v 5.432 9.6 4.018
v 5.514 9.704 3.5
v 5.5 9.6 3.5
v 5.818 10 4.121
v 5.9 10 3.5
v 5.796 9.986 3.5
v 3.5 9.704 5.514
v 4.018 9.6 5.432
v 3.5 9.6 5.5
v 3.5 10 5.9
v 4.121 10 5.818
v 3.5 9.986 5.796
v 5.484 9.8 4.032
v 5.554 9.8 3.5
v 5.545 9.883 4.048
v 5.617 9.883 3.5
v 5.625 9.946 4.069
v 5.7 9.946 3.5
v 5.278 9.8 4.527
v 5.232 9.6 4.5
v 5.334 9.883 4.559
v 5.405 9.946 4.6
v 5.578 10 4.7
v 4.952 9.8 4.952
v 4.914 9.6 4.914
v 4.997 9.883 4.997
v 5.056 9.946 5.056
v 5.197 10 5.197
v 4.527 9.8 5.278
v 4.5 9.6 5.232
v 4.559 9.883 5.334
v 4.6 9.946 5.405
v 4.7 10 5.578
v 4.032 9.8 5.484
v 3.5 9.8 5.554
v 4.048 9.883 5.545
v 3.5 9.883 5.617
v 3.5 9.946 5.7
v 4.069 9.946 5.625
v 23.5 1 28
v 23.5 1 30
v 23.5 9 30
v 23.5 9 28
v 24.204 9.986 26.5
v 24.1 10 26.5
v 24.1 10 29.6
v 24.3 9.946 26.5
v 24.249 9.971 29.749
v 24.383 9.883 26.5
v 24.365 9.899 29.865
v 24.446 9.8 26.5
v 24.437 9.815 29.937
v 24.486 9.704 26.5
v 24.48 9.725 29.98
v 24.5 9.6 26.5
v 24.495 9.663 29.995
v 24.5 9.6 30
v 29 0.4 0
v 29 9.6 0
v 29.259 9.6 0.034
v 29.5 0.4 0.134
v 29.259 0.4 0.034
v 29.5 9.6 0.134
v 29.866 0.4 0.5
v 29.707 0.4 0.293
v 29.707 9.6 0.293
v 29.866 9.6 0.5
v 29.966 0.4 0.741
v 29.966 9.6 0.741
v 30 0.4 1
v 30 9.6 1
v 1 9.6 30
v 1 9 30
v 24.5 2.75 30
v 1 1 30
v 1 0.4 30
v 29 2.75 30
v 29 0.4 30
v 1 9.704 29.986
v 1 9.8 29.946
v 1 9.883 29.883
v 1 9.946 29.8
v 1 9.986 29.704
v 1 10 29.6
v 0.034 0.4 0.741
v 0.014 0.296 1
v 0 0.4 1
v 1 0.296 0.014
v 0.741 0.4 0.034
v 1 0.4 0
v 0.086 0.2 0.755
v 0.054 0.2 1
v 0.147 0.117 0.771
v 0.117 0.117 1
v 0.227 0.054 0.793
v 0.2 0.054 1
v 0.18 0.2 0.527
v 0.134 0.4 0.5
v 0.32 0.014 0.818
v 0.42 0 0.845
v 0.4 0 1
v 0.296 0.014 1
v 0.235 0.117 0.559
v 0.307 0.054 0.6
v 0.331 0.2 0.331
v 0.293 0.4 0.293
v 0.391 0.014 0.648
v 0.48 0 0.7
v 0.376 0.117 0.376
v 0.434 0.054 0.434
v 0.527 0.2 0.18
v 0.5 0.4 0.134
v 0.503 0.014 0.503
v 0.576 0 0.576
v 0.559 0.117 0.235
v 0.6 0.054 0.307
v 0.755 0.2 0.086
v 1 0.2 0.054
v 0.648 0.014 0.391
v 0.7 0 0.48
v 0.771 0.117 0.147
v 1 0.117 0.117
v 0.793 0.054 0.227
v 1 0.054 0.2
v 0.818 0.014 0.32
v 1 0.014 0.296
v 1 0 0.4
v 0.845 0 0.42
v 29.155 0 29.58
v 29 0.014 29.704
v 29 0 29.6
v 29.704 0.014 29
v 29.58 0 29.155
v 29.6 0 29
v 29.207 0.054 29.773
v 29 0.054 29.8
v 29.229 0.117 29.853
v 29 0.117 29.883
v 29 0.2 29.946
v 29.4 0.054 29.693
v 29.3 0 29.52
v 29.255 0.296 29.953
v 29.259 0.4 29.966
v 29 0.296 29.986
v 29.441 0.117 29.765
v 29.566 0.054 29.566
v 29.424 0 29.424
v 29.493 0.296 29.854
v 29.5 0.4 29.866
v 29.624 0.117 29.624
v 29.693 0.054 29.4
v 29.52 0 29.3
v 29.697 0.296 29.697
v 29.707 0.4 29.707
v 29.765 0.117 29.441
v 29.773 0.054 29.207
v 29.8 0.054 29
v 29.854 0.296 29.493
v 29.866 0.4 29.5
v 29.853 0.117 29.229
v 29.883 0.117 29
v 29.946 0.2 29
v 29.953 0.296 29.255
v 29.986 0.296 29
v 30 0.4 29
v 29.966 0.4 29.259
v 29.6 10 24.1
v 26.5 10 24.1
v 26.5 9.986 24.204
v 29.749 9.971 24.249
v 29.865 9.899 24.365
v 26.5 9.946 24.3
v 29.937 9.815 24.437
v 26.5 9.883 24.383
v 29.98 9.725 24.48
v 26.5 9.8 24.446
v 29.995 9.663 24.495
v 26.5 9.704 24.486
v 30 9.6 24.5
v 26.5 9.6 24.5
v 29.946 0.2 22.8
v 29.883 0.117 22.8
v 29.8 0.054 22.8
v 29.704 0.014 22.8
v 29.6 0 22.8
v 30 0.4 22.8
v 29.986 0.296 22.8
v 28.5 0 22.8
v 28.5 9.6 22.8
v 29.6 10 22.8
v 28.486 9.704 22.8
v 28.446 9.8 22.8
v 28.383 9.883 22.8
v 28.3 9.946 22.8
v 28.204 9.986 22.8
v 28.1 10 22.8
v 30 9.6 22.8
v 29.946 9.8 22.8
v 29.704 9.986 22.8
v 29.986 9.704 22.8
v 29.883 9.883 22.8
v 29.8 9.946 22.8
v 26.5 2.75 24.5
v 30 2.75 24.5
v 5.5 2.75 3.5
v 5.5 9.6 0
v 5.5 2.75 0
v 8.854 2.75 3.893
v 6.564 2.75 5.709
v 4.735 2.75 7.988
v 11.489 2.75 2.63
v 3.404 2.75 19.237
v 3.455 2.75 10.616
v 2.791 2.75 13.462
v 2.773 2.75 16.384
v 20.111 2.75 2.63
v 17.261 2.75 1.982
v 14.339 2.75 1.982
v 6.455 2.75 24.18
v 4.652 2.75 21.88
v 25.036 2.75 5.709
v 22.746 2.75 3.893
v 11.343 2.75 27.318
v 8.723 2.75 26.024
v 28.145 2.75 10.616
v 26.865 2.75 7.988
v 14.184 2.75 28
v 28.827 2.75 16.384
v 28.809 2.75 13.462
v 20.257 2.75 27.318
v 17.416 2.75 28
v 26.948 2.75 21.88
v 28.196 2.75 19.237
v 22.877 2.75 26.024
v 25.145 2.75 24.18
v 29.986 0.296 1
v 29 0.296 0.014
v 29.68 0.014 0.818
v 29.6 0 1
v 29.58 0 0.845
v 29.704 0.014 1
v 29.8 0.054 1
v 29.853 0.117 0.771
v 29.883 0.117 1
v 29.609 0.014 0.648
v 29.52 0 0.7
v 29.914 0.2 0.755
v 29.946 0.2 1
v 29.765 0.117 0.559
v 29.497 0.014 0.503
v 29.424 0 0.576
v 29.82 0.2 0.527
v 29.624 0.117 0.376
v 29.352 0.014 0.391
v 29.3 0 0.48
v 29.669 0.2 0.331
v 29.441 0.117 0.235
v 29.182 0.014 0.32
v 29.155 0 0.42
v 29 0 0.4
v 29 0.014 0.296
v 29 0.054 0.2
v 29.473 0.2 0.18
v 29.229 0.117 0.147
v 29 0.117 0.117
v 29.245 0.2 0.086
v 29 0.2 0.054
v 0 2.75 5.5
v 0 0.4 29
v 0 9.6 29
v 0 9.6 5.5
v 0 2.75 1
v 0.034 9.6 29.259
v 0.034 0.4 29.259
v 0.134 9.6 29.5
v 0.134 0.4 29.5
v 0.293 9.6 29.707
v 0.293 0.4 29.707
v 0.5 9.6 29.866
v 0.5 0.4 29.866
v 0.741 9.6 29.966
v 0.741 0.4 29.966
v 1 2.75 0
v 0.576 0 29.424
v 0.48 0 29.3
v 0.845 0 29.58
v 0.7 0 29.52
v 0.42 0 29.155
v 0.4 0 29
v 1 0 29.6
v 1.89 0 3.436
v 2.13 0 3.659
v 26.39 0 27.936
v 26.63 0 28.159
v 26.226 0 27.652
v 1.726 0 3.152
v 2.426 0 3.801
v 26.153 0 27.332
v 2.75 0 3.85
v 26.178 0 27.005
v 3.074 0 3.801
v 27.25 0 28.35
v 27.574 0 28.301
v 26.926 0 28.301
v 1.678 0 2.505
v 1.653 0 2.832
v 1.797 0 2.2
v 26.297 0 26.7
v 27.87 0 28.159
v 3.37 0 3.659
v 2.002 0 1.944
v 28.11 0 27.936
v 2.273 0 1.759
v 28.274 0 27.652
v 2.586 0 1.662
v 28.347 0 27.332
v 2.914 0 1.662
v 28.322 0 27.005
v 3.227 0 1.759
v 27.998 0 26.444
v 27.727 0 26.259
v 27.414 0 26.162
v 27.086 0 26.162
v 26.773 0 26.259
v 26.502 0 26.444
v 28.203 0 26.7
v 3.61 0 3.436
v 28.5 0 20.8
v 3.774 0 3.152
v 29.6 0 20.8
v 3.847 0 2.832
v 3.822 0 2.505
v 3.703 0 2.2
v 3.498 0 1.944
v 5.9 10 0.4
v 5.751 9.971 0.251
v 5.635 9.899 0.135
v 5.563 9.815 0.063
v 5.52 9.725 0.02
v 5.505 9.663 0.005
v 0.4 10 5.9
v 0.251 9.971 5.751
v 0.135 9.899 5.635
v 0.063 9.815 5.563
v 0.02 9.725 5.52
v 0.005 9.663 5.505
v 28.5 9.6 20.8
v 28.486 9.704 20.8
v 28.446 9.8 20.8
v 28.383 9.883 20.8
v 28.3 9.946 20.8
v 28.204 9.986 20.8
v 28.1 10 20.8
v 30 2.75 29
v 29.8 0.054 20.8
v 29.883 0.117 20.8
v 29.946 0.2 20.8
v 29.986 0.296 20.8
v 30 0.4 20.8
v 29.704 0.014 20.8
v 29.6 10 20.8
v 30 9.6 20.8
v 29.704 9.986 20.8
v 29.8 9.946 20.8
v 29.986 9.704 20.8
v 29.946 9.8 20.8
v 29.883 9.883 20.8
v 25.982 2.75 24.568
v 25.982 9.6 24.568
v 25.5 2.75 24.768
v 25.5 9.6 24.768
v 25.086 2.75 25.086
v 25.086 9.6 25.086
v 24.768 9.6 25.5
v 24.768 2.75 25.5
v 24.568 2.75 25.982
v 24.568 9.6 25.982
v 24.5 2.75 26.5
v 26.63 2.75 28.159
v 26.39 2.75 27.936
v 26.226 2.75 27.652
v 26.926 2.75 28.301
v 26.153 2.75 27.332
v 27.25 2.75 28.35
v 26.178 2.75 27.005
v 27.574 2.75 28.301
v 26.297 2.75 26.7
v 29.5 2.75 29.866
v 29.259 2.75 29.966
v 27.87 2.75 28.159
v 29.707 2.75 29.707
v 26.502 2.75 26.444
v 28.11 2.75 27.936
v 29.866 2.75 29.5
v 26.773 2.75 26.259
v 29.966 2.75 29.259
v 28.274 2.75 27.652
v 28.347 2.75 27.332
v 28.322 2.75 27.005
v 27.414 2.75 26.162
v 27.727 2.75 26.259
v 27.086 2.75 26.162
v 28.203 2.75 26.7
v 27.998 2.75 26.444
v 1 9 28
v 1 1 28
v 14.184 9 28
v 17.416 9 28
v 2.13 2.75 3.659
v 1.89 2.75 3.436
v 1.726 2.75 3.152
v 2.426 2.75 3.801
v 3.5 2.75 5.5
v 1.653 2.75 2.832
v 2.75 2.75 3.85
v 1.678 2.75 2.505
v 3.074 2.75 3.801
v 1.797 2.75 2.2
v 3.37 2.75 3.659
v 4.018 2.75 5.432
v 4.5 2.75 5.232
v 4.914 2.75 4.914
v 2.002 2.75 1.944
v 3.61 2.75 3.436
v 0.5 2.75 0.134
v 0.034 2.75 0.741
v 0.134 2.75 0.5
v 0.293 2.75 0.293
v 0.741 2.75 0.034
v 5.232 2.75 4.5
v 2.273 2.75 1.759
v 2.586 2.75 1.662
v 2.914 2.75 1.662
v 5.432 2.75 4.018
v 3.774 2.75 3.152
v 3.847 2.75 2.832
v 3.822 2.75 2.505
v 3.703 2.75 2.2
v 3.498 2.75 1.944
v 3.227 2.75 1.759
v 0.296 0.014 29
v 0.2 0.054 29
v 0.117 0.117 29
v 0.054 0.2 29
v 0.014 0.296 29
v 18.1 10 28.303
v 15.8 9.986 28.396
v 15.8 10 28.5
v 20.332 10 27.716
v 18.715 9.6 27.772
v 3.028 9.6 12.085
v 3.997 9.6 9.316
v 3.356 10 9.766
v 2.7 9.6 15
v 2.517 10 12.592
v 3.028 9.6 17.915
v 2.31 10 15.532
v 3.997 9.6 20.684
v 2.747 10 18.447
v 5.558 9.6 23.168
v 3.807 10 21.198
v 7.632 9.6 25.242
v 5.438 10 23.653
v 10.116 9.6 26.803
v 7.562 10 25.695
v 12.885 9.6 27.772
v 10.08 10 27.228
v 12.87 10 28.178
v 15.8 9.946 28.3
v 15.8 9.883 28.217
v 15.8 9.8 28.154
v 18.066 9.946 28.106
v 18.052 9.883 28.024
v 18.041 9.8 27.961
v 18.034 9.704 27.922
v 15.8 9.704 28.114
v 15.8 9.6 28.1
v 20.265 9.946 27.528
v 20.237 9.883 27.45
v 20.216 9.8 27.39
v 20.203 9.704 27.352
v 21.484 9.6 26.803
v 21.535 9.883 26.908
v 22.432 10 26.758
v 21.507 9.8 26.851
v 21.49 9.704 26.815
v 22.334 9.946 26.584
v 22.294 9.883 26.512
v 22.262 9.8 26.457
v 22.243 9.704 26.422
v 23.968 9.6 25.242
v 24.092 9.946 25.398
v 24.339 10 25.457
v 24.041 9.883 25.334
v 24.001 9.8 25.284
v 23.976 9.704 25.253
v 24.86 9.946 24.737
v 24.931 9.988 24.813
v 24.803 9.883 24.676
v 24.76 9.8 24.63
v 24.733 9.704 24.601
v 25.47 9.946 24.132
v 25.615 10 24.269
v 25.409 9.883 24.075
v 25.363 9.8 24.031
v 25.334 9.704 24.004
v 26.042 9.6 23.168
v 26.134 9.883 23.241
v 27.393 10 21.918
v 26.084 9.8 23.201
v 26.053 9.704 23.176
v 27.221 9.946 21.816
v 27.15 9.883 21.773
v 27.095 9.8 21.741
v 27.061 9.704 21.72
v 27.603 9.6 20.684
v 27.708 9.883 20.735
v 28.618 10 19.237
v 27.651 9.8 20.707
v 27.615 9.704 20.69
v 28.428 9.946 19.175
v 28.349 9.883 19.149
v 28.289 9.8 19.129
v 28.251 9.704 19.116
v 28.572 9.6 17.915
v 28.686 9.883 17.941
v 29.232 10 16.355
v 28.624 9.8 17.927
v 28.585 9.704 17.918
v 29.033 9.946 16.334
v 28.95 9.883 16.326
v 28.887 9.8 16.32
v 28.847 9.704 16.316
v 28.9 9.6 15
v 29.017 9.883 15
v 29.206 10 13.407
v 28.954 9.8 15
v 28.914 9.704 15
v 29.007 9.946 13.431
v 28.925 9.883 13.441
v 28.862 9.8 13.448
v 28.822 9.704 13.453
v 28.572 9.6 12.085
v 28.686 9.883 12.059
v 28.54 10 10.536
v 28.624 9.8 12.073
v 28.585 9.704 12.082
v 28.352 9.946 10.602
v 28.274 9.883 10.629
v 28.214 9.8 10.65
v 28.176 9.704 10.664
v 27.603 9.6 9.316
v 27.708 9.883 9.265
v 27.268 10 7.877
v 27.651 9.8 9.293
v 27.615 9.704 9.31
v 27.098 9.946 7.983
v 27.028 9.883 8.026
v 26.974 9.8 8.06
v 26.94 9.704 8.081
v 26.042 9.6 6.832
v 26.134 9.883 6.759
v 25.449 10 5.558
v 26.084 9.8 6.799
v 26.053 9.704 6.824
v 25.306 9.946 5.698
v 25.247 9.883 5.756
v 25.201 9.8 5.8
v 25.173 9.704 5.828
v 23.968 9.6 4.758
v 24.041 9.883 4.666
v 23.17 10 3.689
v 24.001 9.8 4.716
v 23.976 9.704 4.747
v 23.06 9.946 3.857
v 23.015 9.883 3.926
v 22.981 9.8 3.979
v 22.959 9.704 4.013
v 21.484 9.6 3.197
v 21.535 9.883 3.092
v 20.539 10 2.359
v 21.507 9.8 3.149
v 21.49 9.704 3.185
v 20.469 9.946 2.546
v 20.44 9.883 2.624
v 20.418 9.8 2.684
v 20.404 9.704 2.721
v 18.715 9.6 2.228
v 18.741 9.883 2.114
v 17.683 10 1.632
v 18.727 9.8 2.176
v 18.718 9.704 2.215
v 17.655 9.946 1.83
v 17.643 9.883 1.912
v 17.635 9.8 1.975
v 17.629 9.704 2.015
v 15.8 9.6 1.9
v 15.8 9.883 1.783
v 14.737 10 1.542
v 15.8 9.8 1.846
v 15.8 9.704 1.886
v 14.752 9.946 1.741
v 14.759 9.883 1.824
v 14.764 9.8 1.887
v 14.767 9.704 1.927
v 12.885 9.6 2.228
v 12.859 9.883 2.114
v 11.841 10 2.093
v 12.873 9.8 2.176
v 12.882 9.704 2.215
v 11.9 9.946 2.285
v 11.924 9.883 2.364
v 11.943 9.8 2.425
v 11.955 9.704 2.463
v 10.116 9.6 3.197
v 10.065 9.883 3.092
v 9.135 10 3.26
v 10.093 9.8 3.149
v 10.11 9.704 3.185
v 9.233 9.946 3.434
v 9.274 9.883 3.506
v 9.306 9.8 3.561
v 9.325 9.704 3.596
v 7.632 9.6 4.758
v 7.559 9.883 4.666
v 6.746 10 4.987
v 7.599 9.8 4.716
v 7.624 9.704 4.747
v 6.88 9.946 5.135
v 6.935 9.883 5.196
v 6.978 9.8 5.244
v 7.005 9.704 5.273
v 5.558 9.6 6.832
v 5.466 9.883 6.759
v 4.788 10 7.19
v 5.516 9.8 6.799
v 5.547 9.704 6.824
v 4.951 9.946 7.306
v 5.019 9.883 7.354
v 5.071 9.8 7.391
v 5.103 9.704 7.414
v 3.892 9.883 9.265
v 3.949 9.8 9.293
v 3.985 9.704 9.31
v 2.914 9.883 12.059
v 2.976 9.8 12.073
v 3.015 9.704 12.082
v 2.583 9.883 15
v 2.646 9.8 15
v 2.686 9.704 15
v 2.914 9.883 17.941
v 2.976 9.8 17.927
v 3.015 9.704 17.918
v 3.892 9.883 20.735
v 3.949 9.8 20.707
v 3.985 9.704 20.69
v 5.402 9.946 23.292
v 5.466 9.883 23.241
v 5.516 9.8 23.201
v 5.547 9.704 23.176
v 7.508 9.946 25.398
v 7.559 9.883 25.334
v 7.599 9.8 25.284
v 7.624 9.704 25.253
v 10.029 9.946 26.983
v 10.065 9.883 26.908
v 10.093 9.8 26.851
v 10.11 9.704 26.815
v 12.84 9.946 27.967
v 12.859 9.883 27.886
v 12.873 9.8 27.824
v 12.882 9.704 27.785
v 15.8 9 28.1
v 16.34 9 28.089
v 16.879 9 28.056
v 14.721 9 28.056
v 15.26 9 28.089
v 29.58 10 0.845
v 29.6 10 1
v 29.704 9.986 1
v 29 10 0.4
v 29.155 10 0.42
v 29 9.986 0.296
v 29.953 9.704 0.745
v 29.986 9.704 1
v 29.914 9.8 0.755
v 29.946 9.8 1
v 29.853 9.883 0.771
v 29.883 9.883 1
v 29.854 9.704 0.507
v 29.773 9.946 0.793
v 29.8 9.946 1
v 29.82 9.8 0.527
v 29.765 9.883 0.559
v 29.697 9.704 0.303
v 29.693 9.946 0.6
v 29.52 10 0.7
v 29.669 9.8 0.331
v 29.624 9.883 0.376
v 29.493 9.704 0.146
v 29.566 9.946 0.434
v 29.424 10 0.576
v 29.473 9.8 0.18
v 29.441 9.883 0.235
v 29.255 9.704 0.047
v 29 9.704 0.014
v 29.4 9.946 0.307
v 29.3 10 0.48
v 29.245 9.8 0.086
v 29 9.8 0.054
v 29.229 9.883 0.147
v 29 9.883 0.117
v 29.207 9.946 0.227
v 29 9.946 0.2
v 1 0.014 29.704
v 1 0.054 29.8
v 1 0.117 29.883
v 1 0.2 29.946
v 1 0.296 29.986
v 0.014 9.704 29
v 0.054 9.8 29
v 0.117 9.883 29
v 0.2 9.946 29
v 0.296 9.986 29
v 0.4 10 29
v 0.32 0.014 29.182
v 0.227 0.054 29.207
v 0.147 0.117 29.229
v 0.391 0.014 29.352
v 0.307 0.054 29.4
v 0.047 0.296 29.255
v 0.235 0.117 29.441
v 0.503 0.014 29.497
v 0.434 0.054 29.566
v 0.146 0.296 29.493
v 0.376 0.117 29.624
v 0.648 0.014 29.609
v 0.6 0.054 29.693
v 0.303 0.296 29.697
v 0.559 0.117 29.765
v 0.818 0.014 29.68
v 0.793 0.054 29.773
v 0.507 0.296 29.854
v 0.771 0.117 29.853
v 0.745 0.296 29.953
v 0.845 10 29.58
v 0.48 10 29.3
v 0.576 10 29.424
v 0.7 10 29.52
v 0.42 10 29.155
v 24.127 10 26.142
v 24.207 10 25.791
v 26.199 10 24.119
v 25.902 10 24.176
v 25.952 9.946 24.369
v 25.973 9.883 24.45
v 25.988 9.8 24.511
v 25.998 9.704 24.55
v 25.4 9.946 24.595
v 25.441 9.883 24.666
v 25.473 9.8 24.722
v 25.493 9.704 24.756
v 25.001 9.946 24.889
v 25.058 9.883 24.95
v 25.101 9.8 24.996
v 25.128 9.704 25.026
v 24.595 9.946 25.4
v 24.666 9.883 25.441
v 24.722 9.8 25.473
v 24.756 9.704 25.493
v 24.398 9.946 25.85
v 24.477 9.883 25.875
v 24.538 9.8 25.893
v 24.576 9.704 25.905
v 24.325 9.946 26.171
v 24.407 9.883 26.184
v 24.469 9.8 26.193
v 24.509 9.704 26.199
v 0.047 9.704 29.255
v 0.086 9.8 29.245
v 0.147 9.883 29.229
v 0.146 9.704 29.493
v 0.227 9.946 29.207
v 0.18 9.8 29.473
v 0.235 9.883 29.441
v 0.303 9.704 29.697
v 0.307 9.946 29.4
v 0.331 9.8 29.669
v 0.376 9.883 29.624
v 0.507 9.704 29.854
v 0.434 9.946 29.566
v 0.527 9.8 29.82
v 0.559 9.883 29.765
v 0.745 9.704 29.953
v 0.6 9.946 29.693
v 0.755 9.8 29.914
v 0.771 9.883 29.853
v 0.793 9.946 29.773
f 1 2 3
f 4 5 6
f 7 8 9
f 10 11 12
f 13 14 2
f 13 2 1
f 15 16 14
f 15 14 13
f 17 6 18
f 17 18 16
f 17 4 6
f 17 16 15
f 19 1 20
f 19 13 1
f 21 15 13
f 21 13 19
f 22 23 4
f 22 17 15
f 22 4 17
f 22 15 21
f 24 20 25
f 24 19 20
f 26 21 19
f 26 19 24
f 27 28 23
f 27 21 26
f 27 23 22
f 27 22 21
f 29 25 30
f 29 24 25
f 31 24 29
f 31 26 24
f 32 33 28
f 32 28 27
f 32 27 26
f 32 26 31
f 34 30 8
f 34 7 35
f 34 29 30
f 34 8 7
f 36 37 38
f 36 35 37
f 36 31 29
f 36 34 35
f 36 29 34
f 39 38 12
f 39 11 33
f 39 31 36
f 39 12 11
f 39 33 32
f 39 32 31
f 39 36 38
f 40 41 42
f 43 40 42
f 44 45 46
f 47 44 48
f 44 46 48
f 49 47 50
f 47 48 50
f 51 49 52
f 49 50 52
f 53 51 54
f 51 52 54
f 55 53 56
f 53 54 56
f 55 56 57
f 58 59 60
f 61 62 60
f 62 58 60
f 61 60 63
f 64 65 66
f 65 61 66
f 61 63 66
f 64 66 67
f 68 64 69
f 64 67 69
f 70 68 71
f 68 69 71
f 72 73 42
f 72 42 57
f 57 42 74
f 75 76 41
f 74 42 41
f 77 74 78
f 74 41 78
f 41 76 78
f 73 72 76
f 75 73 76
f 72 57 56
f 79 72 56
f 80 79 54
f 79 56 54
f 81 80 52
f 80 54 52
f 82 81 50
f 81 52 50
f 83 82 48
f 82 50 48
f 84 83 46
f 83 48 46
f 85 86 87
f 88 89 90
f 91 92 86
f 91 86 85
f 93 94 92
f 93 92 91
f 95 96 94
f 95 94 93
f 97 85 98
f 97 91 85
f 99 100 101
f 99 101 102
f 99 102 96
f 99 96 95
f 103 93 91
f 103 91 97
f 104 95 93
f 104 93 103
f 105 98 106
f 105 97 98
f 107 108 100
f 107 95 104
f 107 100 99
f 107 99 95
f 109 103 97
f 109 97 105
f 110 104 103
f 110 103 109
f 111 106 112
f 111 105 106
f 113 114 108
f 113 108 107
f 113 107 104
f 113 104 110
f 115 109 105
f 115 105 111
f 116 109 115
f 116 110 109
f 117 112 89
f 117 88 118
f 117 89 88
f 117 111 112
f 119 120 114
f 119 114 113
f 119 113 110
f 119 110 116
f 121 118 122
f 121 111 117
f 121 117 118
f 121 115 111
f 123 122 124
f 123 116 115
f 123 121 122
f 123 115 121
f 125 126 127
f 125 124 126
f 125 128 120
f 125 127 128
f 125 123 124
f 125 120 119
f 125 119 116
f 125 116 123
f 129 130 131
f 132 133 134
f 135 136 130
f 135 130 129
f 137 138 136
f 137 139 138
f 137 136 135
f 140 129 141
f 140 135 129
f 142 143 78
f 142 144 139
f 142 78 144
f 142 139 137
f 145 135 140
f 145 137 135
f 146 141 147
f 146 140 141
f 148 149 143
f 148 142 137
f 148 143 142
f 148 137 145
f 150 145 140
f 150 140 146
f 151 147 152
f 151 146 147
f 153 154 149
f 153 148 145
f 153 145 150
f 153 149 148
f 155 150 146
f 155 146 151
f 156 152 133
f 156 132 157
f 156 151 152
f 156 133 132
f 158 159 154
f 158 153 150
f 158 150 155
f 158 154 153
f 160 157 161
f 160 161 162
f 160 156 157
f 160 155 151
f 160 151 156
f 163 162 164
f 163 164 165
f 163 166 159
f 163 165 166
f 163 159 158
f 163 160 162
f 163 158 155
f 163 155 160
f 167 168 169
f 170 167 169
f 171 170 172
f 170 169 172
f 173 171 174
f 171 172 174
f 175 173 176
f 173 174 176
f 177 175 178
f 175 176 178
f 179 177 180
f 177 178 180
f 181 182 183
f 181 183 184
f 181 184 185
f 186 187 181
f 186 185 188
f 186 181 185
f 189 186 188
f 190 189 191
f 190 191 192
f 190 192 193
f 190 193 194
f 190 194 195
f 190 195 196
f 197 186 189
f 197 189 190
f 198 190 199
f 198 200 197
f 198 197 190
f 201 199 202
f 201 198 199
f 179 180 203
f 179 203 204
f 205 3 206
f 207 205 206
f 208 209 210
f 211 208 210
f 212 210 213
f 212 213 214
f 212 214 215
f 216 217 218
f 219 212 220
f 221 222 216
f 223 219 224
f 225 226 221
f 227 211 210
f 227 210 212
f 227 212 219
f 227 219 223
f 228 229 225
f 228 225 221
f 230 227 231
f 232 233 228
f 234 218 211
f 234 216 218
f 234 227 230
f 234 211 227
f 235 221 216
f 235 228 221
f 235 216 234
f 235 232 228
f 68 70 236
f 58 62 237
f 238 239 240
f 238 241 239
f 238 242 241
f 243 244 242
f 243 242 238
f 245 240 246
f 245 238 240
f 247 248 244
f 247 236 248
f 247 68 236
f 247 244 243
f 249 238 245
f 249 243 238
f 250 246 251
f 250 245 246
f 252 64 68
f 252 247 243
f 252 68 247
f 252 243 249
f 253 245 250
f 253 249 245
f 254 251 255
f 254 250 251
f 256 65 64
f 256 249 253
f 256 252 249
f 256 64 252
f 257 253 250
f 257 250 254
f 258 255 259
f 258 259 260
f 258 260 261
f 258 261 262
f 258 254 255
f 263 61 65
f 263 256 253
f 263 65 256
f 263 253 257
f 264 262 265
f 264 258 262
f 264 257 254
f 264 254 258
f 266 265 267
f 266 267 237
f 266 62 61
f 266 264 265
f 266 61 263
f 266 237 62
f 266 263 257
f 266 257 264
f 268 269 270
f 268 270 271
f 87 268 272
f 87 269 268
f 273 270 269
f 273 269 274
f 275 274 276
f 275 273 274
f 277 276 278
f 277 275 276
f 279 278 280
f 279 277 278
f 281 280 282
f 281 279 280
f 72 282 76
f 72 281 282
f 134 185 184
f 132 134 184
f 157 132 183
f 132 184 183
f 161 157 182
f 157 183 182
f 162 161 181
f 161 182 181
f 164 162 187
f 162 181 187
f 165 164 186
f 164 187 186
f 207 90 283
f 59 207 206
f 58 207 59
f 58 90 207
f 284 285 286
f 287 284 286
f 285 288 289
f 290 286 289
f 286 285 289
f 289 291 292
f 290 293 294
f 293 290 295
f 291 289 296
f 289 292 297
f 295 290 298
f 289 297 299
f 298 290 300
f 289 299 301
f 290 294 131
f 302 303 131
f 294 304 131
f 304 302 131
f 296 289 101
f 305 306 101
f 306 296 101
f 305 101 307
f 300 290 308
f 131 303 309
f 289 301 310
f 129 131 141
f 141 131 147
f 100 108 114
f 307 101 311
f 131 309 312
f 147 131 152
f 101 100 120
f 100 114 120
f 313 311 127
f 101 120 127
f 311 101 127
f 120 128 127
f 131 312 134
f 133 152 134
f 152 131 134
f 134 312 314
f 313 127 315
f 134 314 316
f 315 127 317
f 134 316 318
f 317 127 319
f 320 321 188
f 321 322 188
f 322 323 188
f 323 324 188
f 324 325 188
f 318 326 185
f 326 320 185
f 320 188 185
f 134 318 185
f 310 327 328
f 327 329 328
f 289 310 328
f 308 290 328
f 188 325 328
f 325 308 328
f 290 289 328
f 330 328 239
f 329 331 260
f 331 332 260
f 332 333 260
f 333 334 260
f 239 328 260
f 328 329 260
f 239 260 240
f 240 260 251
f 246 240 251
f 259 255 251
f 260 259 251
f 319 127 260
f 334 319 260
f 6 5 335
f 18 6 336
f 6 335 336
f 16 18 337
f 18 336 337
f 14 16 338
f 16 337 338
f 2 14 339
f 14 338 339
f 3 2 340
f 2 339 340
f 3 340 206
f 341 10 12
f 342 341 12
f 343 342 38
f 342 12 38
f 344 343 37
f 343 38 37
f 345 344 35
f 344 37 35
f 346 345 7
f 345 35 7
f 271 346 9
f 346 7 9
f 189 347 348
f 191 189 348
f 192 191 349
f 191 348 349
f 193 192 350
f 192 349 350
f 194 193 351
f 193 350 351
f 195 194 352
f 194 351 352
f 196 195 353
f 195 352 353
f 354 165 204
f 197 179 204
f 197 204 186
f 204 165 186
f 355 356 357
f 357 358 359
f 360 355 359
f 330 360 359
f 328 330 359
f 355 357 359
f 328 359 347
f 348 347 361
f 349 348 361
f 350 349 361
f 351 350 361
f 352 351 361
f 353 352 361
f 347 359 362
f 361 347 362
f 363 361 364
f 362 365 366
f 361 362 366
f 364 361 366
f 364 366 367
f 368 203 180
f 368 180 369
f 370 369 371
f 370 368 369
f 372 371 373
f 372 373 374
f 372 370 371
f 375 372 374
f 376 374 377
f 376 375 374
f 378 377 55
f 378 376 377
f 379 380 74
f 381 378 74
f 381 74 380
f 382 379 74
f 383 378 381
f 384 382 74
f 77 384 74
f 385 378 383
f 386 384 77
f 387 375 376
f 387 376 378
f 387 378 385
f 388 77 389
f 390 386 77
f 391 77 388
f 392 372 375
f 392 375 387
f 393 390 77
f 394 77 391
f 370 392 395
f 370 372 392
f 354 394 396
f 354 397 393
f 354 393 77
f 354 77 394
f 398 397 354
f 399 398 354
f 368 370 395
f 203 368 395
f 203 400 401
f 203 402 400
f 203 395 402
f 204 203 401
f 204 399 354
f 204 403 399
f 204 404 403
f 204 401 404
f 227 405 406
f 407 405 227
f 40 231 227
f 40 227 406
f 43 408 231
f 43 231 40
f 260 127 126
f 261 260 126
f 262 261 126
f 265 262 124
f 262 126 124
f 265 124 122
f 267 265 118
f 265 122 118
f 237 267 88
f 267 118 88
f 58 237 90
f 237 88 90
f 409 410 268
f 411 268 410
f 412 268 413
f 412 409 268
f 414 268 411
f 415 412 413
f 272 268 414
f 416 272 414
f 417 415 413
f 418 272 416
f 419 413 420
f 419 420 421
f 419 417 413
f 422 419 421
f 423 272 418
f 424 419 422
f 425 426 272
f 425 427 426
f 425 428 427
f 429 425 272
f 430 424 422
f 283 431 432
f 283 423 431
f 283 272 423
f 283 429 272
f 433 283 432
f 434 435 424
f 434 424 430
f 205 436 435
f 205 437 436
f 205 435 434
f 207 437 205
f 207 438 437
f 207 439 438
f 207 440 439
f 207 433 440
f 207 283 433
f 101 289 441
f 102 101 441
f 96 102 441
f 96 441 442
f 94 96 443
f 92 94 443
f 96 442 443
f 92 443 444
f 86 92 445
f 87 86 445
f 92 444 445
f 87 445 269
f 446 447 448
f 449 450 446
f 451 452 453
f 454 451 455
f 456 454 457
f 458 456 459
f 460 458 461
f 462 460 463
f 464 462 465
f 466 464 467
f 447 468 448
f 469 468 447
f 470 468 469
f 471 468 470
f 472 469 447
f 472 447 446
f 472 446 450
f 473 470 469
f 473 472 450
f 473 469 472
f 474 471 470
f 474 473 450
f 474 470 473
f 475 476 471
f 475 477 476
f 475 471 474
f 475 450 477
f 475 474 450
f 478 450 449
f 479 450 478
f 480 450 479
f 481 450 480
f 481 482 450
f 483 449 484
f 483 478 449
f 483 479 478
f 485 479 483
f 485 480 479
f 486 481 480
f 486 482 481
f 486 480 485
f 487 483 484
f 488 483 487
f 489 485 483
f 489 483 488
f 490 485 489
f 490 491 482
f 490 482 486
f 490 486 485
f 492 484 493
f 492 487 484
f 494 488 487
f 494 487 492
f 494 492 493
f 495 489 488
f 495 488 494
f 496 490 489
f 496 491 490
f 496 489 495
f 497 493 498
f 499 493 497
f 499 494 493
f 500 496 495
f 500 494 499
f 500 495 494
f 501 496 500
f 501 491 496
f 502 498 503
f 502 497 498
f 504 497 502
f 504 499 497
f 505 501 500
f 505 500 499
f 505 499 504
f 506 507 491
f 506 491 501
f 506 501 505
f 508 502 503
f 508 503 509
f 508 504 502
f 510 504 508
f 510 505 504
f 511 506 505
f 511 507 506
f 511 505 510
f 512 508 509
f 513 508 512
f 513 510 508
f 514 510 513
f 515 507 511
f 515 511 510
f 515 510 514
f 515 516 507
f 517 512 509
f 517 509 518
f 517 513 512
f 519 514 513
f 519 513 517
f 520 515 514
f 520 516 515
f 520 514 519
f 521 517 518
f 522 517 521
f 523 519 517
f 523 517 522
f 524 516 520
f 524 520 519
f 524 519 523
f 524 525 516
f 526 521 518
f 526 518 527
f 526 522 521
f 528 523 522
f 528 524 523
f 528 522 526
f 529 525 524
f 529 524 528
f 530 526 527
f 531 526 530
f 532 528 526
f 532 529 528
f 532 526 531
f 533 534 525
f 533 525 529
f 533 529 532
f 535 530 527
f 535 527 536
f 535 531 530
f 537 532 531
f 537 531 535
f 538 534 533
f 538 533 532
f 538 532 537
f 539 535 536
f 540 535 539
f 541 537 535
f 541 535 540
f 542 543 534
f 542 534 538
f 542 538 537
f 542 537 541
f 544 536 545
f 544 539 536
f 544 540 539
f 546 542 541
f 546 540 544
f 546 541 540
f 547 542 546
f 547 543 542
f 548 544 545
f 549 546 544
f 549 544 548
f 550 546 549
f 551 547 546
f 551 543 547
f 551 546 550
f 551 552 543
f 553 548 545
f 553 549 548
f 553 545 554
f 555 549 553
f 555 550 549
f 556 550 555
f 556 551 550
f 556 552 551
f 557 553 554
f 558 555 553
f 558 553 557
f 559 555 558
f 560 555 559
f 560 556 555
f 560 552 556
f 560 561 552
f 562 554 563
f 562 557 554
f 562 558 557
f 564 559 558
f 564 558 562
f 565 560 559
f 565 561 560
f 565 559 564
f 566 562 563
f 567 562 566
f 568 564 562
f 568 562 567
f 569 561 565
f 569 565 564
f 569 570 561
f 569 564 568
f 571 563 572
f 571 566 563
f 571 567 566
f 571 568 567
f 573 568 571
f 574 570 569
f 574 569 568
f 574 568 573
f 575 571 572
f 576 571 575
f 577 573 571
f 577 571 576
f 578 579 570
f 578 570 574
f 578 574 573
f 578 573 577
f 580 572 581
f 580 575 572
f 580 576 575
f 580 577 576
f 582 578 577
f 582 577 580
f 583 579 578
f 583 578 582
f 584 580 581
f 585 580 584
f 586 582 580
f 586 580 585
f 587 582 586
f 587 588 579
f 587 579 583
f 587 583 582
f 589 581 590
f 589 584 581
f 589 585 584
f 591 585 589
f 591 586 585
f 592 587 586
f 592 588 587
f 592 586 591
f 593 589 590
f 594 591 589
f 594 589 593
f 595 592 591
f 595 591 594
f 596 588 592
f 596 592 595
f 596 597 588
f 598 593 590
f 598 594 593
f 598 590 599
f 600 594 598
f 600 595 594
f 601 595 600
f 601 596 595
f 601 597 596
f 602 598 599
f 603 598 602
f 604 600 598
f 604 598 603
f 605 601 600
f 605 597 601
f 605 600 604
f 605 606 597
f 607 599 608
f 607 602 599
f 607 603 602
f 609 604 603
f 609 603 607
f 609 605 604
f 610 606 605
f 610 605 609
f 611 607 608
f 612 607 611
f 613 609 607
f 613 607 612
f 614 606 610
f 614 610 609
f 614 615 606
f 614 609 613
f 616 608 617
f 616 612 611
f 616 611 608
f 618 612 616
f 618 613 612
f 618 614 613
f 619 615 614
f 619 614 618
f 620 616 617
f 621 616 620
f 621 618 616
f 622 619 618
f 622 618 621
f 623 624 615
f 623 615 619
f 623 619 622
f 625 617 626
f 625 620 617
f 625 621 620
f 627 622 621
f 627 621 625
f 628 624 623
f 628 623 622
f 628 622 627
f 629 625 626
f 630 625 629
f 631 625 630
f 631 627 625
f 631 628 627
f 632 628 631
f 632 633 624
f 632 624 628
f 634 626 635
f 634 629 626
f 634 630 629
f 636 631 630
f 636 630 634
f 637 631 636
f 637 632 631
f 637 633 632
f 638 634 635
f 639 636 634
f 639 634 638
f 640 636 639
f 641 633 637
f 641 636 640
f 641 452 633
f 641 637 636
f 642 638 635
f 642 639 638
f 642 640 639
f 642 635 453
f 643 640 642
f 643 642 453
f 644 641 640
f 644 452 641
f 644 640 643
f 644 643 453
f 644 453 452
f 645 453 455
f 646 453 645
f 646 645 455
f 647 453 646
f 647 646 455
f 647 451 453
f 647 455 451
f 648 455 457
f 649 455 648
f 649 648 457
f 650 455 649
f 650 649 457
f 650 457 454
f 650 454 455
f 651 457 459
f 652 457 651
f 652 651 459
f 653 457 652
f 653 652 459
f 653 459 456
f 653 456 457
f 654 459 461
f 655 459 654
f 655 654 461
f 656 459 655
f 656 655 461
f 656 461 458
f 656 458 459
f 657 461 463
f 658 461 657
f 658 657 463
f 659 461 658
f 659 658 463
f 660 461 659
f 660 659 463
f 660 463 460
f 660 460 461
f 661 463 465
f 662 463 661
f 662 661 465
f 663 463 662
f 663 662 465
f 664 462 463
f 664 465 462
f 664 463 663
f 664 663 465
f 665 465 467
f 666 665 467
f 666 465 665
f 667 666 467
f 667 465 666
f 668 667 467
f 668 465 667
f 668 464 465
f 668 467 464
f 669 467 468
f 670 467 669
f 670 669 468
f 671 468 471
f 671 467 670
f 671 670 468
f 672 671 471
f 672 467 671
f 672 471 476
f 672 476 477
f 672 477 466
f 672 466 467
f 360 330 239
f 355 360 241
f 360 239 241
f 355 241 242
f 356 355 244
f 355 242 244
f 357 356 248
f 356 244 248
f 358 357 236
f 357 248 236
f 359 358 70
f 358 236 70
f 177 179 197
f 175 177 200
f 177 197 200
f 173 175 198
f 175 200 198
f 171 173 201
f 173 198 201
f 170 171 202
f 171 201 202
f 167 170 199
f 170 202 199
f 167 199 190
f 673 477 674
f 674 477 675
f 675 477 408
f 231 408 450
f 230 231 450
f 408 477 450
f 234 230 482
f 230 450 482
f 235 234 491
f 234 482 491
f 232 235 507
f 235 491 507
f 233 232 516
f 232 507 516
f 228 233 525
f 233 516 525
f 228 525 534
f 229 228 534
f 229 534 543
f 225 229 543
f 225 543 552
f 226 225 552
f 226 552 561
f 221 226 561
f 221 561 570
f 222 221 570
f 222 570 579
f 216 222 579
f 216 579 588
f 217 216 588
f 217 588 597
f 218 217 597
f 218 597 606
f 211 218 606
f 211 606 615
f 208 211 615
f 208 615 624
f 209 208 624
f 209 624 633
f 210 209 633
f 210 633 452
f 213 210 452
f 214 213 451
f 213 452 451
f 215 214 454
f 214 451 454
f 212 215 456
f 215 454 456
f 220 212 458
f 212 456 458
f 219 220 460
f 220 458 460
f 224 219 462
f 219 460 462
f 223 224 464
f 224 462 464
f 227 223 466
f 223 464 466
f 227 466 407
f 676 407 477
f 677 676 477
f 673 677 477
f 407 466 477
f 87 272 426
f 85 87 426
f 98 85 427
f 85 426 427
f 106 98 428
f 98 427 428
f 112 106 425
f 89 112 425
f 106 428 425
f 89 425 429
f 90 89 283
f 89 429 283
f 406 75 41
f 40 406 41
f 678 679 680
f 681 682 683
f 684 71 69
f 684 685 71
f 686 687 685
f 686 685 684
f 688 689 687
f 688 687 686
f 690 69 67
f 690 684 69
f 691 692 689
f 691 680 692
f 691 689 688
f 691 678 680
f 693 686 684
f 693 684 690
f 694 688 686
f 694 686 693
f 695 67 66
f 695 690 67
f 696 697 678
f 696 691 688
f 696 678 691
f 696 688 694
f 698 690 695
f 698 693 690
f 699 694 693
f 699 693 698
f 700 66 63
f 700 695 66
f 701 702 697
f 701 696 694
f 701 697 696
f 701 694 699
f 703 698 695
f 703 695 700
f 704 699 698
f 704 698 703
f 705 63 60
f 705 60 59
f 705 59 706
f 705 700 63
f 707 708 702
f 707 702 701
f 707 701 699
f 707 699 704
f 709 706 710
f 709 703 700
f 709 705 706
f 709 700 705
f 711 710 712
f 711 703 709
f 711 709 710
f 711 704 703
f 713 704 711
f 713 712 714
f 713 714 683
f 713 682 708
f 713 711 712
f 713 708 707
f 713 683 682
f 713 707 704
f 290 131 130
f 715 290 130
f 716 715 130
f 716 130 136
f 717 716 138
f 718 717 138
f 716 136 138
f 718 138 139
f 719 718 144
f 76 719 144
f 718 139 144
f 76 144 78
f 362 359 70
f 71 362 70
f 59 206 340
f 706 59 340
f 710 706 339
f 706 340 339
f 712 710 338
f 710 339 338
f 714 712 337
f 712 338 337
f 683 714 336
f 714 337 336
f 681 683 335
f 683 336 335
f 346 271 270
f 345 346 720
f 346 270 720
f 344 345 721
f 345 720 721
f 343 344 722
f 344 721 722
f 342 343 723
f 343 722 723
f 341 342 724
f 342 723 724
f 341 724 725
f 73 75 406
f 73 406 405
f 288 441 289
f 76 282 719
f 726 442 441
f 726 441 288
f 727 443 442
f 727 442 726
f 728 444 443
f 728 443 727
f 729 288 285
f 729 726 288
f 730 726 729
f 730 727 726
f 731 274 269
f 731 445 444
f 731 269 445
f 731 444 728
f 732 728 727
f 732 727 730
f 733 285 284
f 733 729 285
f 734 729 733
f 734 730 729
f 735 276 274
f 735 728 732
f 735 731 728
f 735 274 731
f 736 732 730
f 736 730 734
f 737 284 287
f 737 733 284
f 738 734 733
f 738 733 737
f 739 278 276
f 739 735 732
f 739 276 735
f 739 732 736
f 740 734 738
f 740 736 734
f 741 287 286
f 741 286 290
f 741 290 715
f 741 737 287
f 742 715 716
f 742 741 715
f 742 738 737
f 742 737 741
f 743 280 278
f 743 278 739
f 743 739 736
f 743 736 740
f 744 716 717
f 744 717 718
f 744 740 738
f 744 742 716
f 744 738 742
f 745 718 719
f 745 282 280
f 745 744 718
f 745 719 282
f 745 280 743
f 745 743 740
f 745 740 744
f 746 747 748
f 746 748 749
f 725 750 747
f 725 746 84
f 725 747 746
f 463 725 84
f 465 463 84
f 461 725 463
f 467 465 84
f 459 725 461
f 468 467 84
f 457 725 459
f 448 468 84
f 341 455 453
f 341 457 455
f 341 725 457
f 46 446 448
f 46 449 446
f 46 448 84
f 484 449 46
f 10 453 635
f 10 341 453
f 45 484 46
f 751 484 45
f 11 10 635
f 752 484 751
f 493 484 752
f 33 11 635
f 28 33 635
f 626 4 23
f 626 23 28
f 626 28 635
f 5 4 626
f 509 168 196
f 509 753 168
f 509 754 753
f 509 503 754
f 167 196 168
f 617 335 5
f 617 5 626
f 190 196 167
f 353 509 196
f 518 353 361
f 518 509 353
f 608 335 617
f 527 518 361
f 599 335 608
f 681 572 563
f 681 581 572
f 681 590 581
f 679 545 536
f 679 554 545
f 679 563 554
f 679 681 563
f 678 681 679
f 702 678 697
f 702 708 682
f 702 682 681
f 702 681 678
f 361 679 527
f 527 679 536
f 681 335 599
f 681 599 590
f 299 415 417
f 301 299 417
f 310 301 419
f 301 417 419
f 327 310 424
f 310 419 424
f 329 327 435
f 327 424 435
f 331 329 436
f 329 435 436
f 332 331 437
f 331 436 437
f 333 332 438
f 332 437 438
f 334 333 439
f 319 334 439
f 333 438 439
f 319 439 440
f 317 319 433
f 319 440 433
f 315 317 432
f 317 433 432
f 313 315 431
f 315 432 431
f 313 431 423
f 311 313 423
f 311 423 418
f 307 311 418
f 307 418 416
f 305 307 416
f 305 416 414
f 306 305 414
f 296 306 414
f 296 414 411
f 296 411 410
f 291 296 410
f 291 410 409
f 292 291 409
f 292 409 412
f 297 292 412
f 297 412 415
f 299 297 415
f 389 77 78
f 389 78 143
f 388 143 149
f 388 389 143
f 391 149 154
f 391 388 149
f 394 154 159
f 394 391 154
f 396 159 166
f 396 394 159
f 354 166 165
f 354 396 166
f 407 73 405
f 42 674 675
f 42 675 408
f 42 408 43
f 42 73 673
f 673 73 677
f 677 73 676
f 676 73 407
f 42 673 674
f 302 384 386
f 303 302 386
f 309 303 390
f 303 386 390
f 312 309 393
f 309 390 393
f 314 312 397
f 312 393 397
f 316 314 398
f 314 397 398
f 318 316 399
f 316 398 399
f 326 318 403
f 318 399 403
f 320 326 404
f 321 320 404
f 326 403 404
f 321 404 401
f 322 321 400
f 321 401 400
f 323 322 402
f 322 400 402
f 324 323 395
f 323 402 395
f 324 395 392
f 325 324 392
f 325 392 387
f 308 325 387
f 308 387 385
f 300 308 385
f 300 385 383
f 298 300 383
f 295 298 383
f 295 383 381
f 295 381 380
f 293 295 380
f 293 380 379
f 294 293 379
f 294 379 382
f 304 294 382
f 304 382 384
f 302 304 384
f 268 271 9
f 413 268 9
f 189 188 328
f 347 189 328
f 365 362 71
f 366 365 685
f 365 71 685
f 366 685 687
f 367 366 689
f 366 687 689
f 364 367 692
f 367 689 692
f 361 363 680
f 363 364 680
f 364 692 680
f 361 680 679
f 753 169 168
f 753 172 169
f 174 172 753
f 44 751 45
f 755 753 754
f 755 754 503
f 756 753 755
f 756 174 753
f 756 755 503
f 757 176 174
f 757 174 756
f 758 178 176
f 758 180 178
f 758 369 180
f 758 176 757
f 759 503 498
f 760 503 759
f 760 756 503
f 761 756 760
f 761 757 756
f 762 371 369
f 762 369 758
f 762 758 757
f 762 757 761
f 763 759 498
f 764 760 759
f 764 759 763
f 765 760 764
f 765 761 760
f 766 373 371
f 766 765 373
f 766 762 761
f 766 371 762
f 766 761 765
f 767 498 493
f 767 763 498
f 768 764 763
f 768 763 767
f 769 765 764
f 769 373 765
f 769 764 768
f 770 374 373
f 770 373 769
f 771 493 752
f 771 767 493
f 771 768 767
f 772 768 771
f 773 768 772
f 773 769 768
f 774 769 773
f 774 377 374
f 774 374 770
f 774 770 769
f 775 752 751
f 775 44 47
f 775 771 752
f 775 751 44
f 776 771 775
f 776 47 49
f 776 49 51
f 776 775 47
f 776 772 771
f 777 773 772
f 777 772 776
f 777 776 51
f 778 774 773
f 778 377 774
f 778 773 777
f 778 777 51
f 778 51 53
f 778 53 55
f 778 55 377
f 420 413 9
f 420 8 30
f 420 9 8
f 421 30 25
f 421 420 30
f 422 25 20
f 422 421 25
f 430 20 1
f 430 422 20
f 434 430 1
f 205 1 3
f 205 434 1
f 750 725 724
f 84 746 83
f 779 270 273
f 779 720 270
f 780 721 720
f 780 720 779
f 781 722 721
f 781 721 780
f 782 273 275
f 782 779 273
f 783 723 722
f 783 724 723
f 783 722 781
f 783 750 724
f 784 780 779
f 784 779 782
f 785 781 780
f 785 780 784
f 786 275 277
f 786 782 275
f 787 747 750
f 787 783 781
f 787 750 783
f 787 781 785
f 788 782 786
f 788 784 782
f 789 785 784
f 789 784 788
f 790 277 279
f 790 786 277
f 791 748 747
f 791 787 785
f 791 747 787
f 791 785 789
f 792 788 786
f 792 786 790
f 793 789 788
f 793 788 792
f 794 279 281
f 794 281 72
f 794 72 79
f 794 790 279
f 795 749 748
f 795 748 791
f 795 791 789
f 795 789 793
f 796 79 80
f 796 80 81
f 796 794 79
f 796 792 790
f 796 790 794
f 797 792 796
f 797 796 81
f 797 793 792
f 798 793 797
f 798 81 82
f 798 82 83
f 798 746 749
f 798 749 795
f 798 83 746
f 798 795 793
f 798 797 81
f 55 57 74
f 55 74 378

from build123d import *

# Parameters (mm, degrees)
SKETCH1_W           = 30
SKETCH1_H           = 30
BOSS_EXTRUDE1_DEPTH = 10
SKETCH2_W           = 5.5
SKETCH2_H           = 5.5
CUT_EXTRUDE1_DEPTH  = 7.25
FILLET1_R           = 2
SKETCH3_R           = 13.1
CUT_EXTRUDE2_DEPTH  = 7.25
SKETCH4_R           = 1.1
CUT_EXTRUDE3_DEPTH  = 44.041404485
SKETCH5_W           = 22.5
SKETCH5_H           = 8
CUT_EXTRUDE4_DEPTH  = 2
SKETCH6_W           = 2
SKETCH6_H           = 10
CUT_EXTRUDE5_DEPTH  = 1.5
FILLET2_R           = 1
FILLET3_R           = 0.4


# Some blends are built 0.0001 mm under size
with BuildPart() as part:
    # Sketch1 → Boss-Extrude1 (new body)
    with BuildSketch(Plane(origin=(0, 0, 0), x_dir=(1, 0, 0), z_dir=(0, 1, 0))):
        with Locations((15, -15)):
            Rectangle(SKETCH1_W, SKETCH1_H)
    extrude(amount=BOSS_EXTRUDE1_DEPTH)

    # Sketch2 → Cut-Extrude1 (cut)
    with BuildSketch(Plane(origin=(0, 10, 0), x_dir=(1, 0, 0), z_dir=(0, 1, 0))):
        with Locations((27.25, -27.25)):
            Rectangle(SKETCH2_W, SKETCH2_H)
        with Locations((2.75, -2.75)):
            Rectangle(SKETCH2_W, SKETCH2_H)
    extrude(amount=-CUT_EXTRUDE1_DEPTH, mode=Mode.SUBTRACT)

    # Fillet1
    fillet1_edges = [part.edges().sort_by_distance(p)[0] for p in [
        (24.5, 6.375, 24.5),
        (5.5, 6.375, 5.5),
    ]]
    fillet(fillet1_edges, radius=FILLET1_R)

    # Sketch3 → Cut-Extrude2 (cut)
    with BuildSketch(Plane(origin=(0, 10, 0), x_dir=(1, 0, 0), z_dir=(0, 1, 0))):
        with Locations(Location((15.8, -15, 0), (0, 0, 270))):
            Circle(SKETCH3_R)
    extrude(amount=-CUT_EXTRUDE2_DEPTH, mode=Mode.SUBTRACT)

    # Sketch4 → Cut-Extrude3 (cut, through all)
    with BuildSketch(Plane(origin=(0, 2.75, 0), x_dir=(1, 0, 0), z_dir=(0, 1, 0))):
        with Locations(Location((2.75, -2.75, 0), (0, 0, 270))):
            Circle(SKETCH4_R)
        with Locations(Location((27.25, -27.25, 0), (0, 0, 270))):
            Circle(SKETCH4_R)
    extrude(amount=-CUT_EXTRUDE3_DEPTH, mode=Mode.SUBTRACT)

    # Sketch5 → Cut-Extrude4 (cut)
    with BuildSketch(Plane.XY.offset(30)):
        with Locations((12.25, 5)):
            Rectangle(SKETCH5_W, SKETCH5_H)
    extrude(amount=-CUT_EXTRUDE4_DEPTH, mode=Mode.SUBTRACT)

    # Sketch6 → Cut-Extrude5 (cut)
    with BuildSketch(Plane(origin=(30, 0, 0), x_dir=(0, 0, -1), z_dir=(1, 0, 0))):
        with Locations((-21.8, 5)):
            Rectangle(SKETCH6_W, SKETCH6_H)
    extrude(amount=-CUT_EXTRUDE5_DEPTH, mode=Mode.SUBTRACT)

    # Fillet2
    fillet2_edges = [part.edges().sort_by_distance(p)[0] for p in [
        (30, 1.375, 30),
        (0, 1.375, 0),
        (30, 5, 0),
        (0, 5, 30),
    ]]
    fillet(fillet2_edges, radius=FILLET2_R - 0.0001)  # a hair under: the kernel refuses the full size

    # Fillet3
    # the kernel refuses this fillet: 0.4 mm, written as the material it takes off along each edge
    with BuildSketch(Plane(origin=(4.5, 10, 0), x_dir=(0, 0, 1), z_dir=(1, 0, 0)), Plane(origin=(25.5, 10, 30), x_dir=(0, 0, -1), z_dir=(-1, 0, 0)), Plane(origin=(0, 10, 29.0001), x_dir=(1, 0, 0), z_dir=(0, 0, -1))) as fillet3_piece_1:
        with BuildLine():
            CenterArc((FILLET3_R, FILLET3_R), FILLET3_R, 180, 90)
            Line((0, FILLET3_R), (0, 0))
            Line((0, 0), (FILLET3_R, 0))
        make_face()
    extrude(amount=24.5001, mode=Mode.SUBTRACT)
    with BuildSketch(Plane(origin=(0.9999, 0, 0), x_dir=(0, 1, 0), z_dir=(1, 0, 0)), Plane(origin=(29.0001, 0, 30), x_dir=(0, 1, 0), z_dir=(-1, 0, 0)), Plane(origin=(0, 0, 29.0001), x_dir=(0, 1, 0), z_dir=(0, 0, -1))) as fillet3_piece_2:
        with BuildLine():
            CenterArc((FILLET3_R, FILLET3_R), FILLET3_R, 180, 90)
            Line((0, FILLET3_R), (0, 0))
            Line((0, 0), (FILLET3_R, 0))
        make_face()
    extrude(amount=28.0002, mode=Mode.SUBTRACT)
    with BuildSketch(Plane(origin=(30, 0, 21.8), x_dir=(0, 1, 0), z_dir=(0, 0, 1))) as fillet3_piece_3:
        with BuildLine():
            CenterArc((FILLET3_R, FILLET3_R), FILLET3_R, 180, 90)
            Line((0, FILLET3_R), (0, 0))
            Line((0, 0), (FILLET3_R, 0))
        make_face()
    extrude(amount=7.2001, mode=Mode.SUBTRACT)
    with BuildSketch(Plane(origin=(0.9999, 0, 0.9999), x_dir=(-1, 0, 0), z_dir=(0, 0, 1))) as fillet3_piece_4:
        with BuildLine():
            CenterArc((0.9999 - FILLET3_R, -FILLET3_R), FILLET3_R, 0, 90)
            Line((0.9999, -FILLET3_R), (0.9999, 0))
            Line((0.9999, 0), (0.9999 - FILLET3_R, 0))
        make_face()
    revolve(axis=Axis((0.9999, 0, 0.9999), (0, -1, 0)), revolution_arc=90, mode=Mode.SUBTRACT)
    with BuildSketch(Plane(origin=(0.9999, 0, 29.0001), x_dir=(-1, 0, 0), z_dir=(0, 0, -1))) as fillet3_piece_5:
        with BuildLine():
            CenterArc((0.9999 - FILLET3_R, FILLET3_R), FILLET3_R, 270, 90)
            Line((0.9999 - FILLET3_R, 0), (0.9999, 0))
            Line((0.9999, 0), (0.9999, FILLET3_R))
        make_face()
    revolve(axis=Axis((0.9999, 0, 29.0001), (0, 1, 0)), revolution_arc=90, mode=Mode.SUBTRACT)
    with BuildSketch(Plane(origin=(29.0001, 0, 29.0001), x_dir=(0, 0, 1), z_dir=(-1, 0, 0))) as fillet3_piece_6:
        with BuildLine():
            CenterArc((0.9999 - FILLET3_R, FILLET3_R), FILLET3_R, 270, 90)
            Line((0.9999, FILLET3_R), (0.9999, 0))
            Line((0.9999, 0), (0.9999 - FILLET3_R, 0))
        make_face()
    revolve(axis=Axis((29.0001, 0, 29.0001), (0, 1, 0)), revolution_arc=90, mode=Mode.SUBTRACT)
    with BuildSketch(Plane(origin=(29.0001, 0, 0.9999), x_dir=(1, 0, 0), z_dir=(0, 0, 1))) as fillet3_piece_7:
        with BuildLine():
            CenterArc((0.9999 - FILLET3_R, FILLET3_R), FILLET3_R, 270, 90)
            Line((0.9999 - FILLET3_R, 0), (0.9999, 0))
            Line((0.9999, 0), (0.9999, FILLET3_R))
        make_face()
    revolve(axis=Axis((29.0001, 0, 0.9999), (0, 1, 0)), revolution_arc=90, mode=Mode.SUBTRACT)
    with BuildSketch(Plane(origin=(0.9999, 10, 29.0001), x_dir=(-1, 0, 0), z_dir=(0, 0, -1))) as fillet3_piece_8:
        with BuildLine():
            CenterArc((0.9999 - FILLET3_R, -FILLET3_R), FILLET3_R, 0, 90)
            Line((0.9999, -FILLET3_R), (0.9999, 0))
            Line((0.9999, 0), (0.9999 - FILLET3_R, 0))
        make_face()
    revolve(axis=Axis((0.9999, 10, 29.0001), (0, 1, 0)), revolution_arc=90, mode=Mode.SUBTRACT)
    with BuildSketch(Plane(origin=(29.0001, 10, 0.9999), x_dir=(1, 0, 0), z_dir=(0, 0, 1))) as fillet3_piece_9:
        with BuildLine():
            CenterArc((0.9999 - FILLET3_R, -FILLET3_R), FILLET3_R, 0, 90)
            Line((0.9999, -FILLET3_R), (0.9999, 0))
            Line((0.9999, 0), (0.9999 - FILLET3_R, 0))
        make_face()
    revolve(axis=Axis((29.0001, 10, 0.9999), (0, 1, 0)), revolution_arc=90, mode=Mode.SUBTRACT)
    with BuildSketch(Plane(origin=(30, 10, 21.8), x_dir=(-1, 0, 0), z_dir=(0, 0, 1))) as fillet3_piece_10:
        with BuildLine():
            CenterArc((FILLET3_R, FILLET3_R), FILLET3_R, 180, 90)
            Line((0, FILLET3_R), (0, 0))
            Line((0, 0), (FILLET3_R, 0))
        make_face()
    extrude(amount=3.7, mode=Mode.SUBTRACT)
    with BuildSketch(Plane(origin=(26.5, 10, 24.5), x_dir=(0, 0, -1), z_dir=(1, 0, 0)), Plane(origin=(3.5, 10, 5.5), x_dir=(0, 0, 1), z_dir=(-1, 0, 0)), Plane(origin=(5.5, 10, -1), x_dir=(1, 0, 0), z_dir=(0, 0, 1)), Plane(origin=(24.5, 10, 31), x_dir=(-1, 0, 0), z_dir=(0, 0, -1))) as fillet3_piece_11:
        with BuildLine():
            CenterArc((FILLET3_R, -FILLET3_R), FILLET3_R, 90, 90)
            Line((0, -FILLET3_R), (0, 0))
            Line((0, 0), (FILLET3_R, 0))
        make_face()
    extrude(amount=4.5, mode=Mode.SUBTRACT)
    with BuildSketch(Plane(origin=(3.5, 10, 3.5), x_dir=(1, 0, 0), z_dir=(0, 0, -1))) as fillet3_piece_12:
        with BuildLine():
            CenterArc((2 + FILLET3_R, FILLET3_R), FILLET3_R, 180, 90)
            Line((2, FILLET3_R), (2, 0))
            Line((2, 0), (2 + FILLET3_R, 0))
        make_face()
    revolve(axis=Axis((3.5, 10, 3.5), (0, -1, 0)), revolution_arc=90, mode=Mode.SUBTRACT)
    with BuildSketch(Plane(origin=(26.5, 10, 26.5), x_dir=(0, 0, -1), z_dir=(1, 0, 0))) as fillet3_piece_13:
        with BuildLine():
            CenterArc((2 + FILLET3_R, -FILLET3_R), FILLET3_R, 90, 90)
            Line((2, -FILLET3_R), (2, 0))
            Line((2, 0), (2 + FILLET3_R, 0))
        make_face()
    revolve(axis=Axis((26.5, 10, 26.5), (0, 1, 0)), revolution_arc=90, mode=Mode.SUBTRACT)
    with BuildSketch(Plane(origin=(15.8, 10, 15), x_dir=(0, 0, 1), z_dir=(-1, 0, 0))) as fillet3_piece_14:
        with BuildLine():
            CenterArc((13.1 + FILLET3_R, -FILLET3_R), FILLET3_R, 90, 90)
            Line((13.1, -FILLET3_R), (13.1, 0))
            Line((13.1, 0), (13.1 + FILLET3_R, 0))
        make_face()
    revolve(axis=Axis((15.8, 10, 15), (0, 1, 0)), mode=Mode.SUBTRACT)
    with BuildSketch(Plane(origin=(30, 0, 0.9999), x_dir=(0, 1, 0), z_dir=(0, 0, 1)), Plane(origin=(30, 10, 0.9999), x_dir=(-1, 0, 0), z_dir=(0, 0, 1))) as fillet3_piece_15:
        with BuildLine():
            CenterArc((FILLET3_R, FILLET3_R), FILLET3_R, 180, 90)
            Line((0, FILLET3_R), (0, 0))
            Line((0, 0), (FILLET3_R, 0))
        make_face()
    extrude(amount=20.8001, mode=Mode.SUBTRACT)
    with BuildSketch(Plane(origin=(28.5, 10, 20.8), x_dir=(-1, 0, 0), z_dir=(0, 0, 1))) as fillet3_piece_16:
        with BuildLine():
            CenterArc((FILLET3_R, FILLET3_R), FILLET3_R, 180, 90)
            Line((0, FILLET3_R), (0, 0))
            Line((0, 0), (FILLET3_R, 0))
        make_face()
    extrude(amount=2, mode=Mode.SUBTRACT)


solid = part.part
